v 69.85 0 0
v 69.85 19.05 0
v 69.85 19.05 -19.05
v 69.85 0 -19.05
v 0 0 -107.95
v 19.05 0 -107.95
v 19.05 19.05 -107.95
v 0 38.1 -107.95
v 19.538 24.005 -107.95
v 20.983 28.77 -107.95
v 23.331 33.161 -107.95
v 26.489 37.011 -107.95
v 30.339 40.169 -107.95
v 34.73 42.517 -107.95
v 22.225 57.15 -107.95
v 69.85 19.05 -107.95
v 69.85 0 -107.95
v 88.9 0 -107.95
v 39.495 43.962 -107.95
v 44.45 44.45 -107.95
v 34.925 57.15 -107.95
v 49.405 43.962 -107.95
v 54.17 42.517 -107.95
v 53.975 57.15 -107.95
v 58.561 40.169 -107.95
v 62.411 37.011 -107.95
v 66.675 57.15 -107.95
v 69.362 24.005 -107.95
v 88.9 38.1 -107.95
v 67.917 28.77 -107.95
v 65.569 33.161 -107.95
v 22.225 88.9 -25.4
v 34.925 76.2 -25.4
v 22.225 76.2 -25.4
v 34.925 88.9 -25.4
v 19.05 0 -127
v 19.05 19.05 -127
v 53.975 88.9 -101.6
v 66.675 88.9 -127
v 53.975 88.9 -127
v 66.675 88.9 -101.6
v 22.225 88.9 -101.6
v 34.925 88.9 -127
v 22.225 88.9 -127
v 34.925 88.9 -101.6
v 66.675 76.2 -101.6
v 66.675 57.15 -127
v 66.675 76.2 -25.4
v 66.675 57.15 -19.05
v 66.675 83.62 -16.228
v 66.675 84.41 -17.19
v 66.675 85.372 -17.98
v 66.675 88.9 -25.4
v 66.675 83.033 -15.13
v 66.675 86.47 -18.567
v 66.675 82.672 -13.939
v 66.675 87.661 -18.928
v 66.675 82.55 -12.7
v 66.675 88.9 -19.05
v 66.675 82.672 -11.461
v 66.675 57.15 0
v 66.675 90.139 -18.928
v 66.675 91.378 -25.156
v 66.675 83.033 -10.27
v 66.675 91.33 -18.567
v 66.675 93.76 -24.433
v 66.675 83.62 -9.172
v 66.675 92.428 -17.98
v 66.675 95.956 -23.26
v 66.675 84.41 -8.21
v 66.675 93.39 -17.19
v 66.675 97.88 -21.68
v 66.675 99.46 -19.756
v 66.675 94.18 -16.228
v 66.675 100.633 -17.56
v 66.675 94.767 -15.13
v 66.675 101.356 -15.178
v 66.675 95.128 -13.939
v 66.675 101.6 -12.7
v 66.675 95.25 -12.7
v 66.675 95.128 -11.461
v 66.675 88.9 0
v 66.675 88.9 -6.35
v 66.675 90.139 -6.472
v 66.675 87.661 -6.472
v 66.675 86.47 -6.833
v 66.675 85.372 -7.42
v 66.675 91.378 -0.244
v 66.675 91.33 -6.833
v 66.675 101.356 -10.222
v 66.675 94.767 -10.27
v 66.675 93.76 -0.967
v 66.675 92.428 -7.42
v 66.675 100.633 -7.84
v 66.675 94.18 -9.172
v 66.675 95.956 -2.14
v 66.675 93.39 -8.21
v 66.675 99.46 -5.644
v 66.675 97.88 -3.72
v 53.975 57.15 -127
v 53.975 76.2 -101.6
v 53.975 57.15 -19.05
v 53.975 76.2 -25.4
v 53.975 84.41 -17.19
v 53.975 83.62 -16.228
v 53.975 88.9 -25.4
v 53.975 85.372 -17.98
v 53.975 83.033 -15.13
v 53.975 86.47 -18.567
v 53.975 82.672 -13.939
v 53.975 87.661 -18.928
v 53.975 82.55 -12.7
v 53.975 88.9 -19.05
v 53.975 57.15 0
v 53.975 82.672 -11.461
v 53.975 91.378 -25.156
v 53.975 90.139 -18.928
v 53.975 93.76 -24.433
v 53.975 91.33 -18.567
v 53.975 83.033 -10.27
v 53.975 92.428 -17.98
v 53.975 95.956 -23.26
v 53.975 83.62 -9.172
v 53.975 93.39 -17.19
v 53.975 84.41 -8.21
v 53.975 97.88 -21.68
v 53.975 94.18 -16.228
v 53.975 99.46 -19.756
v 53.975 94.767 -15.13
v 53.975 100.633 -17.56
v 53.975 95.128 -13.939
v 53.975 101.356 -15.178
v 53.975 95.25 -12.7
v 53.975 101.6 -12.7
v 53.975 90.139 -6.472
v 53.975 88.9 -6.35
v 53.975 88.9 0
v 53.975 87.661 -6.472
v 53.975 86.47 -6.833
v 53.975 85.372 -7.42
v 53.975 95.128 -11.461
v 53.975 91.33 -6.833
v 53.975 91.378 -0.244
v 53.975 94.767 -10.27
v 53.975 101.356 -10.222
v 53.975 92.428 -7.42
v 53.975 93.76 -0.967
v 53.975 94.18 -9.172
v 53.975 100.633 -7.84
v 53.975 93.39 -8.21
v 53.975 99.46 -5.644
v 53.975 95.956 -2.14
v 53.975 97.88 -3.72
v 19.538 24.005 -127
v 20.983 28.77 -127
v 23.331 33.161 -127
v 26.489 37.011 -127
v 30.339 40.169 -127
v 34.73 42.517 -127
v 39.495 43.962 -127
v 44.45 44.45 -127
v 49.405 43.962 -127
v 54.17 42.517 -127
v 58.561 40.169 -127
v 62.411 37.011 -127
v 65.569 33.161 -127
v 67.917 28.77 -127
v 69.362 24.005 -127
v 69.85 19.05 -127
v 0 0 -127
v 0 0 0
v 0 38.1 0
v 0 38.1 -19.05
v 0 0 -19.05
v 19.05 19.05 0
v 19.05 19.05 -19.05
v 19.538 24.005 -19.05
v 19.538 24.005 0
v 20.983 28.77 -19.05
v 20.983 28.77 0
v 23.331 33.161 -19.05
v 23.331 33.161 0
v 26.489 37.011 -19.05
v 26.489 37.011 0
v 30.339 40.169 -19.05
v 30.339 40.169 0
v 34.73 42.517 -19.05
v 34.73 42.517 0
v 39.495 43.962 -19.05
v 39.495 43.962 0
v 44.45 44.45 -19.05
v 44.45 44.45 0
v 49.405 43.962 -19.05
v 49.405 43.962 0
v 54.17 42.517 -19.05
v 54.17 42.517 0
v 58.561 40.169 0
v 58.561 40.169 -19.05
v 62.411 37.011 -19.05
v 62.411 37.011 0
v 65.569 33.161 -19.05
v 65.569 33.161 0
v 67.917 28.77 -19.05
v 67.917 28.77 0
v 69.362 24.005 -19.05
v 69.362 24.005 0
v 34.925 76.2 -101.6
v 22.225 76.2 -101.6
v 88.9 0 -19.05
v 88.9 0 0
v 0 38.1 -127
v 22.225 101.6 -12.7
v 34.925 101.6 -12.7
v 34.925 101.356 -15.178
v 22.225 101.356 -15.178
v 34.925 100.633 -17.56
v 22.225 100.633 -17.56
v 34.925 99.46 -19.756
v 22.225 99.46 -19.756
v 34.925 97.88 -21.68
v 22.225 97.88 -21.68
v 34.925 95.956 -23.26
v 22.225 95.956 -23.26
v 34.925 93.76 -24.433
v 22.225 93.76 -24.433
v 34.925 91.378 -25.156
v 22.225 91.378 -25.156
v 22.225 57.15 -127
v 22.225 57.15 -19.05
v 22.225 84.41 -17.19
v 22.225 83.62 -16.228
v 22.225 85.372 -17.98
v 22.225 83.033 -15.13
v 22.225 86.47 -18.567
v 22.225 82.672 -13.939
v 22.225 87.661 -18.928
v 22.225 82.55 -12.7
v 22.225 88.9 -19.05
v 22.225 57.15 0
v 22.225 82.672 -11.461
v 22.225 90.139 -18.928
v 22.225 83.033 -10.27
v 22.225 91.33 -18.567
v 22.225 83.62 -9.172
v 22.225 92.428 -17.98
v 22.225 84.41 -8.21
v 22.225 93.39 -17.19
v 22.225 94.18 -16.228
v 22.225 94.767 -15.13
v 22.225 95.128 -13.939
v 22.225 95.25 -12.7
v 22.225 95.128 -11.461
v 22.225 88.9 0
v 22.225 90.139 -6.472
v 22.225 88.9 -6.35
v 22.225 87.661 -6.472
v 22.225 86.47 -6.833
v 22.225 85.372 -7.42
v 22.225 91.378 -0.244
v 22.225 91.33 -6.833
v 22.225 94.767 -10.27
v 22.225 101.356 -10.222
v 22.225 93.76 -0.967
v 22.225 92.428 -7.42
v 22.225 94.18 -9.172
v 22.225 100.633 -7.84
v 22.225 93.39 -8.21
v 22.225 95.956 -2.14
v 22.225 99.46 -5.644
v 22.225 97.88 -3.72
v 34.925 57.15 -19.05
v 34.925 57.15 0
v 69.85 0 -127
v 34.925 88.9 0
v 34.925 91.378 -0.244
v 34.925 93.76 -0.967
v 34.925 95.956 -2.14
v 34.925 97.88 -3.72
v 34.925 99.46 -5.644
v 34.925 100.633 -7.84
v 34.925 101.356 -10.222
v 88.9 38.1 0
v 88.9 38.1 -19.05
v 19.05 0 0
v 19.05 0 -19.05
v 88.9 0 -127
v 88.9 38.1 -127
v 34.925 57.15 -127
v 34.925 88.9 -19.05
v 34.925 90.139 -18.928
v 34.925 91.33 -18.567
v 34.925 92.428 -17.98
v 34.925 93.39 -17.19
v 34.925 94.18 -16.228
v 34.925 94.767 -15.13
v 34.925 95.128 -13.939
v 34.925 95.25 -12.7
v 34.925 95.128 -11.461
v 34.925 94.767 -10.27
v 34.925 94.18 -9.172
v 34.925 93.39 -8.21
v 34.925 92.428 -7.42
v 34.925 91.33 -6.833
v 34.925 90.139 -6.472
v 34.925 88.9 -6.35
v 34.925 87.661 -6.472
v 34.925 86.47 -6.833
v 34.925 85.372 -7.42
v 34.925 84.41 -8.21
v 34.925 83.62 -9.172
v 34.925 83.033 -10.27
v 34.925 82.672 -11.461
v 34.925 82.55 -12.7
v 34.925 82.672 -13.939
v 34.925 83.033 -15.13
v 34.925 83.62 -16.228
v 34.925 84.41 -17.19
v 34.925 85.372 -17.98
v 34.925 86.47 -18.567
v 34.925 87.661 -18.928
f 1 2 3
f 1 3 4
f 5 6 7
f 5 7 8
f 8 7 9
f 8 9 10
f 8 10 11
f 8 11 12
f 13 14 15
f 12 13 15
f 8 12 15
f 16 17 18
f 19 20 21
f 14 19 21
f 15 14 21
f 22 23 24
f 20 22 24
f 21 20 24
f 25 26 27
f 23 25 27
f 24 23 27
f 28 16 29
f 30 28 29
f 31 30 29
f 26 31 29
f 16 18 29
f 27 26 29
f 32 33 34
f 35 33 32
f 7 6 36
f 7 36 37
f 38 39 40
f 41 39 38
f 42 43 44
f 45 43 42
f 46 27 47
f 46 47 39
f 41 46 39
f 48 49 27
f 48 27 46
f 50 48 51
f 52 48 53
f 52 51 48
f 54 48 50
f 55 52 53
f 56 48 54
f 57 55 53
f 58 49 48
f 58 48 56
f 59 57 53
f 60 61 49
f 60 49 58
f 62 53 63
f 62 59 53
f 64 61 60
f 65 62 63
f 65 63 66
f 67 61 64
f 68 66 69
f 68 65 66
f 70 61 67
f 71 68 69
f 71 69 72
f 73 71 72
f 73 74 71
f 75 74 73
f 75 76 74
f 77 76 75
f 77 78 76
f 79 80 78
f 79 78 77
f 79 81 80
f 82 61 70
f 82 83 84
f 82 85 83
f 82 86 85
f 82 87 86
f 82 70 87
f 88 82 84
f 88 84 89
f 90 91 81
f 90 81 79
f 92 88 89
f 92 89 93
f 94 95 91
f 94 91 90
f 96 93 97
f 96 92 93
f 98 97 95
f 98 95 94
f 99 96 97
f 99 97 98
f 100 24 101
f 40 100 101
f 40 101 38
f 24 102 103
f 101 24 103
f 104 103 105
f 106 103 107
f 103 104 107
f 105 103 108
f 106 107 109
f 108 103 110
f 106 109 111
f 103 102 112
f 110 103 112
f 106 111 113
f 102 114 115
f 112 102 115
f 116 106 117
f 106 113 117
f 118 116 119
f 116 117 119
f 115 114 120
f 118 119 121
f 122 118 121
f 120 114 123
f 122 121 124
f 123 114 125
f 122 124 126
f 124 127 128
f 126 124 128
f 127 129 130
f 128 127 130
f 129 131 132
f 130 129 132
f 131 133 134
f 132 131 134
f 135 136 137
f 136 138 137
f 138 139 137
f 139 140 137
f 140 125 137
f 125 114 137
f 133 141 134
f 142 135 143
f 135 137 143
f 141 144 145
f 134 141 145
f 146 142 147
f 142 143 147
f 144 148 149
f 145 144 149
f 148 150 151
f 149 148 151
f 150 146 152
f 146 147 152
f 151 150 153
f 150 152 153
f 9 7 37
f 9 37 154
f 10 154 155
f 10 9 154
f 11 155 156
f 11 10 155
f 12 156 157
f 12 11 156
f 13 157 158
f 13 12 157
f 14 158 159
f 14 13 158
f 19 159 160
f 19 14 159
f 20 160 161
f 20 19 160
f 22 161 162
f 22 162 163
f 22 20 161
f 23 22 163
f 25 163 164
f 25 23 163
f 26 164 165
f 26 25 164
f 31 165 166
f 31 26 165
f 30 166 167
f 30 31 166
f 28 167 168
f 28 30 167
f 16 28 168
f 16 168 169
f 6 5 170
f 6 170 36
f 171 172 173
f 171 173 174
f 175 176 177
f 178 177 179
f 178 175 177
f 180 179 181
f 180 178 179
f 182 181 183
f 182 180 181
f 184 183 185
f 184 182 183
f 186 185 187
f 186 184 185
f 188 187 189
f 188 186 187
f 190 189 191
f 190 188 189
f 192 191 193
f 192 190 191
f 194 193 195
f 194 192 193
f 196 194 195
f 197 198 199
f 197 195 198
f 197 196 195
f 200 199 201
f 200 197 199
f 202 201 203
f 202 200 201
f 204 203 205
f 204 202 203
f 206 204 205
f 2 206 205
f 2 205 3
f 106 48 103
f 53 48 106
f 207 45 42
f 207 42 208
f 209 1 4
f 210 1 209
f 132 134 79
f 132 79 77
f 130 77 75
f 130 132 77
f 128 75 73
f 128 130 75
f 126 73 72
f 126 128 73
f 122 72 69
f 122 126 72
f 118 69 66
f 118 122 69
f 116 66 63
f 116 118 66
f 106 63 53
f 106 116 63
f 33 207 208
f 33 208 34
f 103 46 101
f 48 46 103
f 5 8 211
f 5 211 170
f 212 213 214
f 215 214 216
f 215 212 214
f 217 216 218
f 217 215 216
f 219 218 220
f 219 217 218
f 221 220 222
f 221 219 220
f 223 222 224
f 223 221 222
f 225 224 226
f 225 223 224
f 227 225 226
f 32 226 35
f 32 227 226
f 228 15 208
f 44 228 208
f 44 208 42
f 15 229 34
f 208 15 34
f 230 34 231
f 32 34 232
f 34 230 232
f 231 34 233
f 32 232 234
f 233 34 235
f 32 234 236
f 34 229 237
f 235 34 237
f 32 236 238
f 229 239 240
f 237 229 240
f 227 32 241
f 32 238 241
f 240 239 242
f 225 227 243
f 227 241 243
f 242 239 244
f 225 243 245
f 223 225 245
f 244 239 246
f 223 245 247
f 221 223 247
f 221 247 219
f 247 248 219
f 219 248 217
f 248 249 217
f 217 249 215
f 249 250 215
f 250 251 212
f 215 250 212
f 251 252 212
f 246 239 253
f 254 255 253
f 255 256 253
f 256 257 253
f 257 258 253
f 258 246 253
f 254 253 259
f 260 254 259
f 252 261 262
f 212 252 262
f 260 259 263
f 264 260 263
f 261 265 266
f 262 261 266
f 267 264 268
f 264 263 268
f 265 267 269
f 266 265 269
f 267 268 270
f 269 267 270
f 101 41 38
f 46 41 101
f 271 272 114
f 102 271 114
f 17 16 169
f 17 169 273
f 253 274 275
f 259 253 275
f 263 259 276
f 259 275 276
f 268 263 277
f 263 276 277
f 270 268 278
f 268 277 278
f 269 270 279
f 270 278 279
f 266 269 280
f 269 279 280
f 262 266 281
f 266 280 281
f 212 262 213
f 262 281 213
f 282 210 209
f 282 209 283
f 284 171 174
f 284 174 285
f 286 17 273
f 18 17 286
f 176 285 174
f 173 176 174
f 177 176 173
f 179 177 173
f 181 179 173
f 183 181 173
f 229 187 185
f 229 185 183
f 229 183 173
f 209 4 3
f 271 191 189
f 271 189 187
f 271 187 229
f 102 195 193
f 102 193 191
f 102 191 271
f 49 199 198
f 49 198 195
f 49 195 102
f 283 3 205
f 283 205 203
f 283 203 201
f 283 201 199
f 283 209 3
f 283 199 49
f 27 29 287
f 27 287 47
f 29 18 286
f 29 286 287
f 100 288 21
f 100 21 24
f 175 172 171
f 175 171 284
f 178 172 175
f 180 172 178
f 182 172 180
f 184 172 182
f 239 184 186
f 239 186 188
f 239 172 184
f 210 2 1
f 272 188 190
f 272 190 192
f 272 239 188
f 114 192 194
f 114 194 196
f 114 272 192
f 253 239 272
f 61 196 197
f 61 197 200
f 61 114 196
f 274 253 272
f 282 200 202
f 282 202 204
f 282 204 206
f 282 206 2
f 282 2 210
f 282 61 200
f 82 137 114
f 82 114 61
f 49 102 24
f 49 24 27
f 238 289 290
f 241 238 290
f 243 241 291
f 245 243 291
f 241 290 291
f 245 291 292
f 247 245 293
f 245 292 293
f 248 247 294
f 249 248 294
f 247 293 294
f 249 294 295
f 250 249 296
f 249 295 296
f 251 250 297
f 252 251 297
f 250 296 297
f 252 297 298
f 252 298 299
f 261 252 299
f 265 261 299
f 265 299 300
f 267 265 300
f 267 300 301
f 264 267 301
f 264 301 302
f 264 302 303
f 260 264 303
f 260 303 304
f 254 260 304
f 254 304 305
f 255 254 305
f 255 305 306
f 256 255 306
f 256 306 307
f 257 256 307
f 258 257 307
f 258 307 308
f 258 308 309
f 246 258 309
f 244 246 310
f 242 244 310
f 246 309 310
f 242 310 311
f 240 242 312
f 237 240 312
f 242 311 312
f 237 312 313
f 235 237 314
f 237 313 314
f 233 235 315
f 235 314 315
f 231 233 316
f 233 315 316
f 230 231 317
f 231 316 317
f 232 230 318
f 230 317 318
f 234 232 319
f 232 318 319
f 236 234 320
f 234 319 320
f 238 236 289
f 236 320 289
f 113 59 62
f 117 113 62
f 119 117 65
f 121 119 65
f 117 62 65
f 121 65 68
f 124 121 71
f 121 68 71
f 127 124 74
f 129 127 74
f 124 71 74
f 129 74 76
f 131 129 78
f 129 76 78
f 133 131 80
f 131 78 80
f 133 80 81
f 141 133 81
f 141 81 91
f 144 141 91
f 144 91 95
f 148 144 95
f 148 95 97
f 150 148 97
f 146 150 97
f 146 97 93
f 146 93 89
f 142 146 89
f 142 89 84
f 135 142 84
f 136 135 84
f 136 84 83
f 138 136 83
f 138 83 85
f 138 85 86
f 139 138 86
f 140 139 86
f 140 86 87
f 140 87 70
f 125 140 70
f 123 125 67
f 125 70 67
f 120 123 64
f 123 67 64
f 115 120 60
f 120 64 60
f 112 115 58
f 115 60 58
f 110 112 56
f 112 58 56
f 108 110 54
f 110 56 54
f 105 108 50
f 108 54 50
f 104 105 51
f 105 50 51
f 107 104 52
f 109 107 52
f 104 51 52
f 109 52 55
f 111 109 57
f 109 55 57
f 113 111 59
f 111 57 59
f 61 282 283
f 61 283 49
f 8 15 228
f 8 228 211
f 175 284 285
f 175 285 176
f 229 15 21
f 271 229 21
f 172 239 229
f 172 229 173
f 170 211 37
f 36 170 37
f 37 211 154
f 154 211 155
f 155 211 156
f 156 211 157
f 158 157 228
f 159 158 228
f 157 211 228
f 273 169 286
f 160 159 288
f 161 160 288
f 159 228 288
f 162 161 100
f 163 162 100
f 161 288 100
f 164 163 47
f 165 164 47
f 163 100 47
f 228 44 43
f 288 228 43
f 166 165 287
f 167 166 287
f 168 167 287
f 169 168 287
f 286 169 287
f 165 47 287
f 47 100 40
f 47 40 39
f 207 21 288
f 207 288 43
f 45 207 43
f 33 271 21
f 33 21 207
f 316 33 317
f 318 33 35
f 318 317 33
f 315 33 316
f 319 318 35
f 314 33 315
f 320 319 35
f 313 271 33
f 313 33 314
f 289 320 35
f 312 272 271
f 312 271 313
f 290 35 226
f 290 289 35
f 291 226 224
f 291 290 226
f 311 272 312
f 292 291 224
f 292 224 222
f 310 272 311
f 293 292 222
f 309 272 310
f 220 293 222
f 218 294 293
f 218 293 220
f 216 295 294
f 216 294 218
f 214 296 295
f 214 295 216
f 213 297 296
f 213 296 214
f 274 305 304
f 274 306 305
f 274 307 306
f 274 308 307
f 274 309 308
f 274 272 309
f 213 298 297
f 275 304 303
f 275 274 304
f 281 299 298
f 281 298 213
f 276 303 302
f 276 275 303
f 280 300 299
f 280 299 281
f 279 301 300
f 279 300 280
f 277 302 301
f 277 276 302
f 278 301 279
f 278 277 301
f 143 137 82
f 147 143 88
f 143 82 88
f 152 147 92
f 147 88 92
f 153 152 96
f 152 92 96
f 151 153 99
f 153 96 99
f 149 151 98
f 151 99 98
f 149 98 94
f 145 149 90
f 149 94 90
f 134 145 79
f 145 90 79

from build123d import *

# Parameters (mm, degrees)
BOSS_EXTRUDE1_DEPTH = 127
SKETCH3_W           = 88.9
SKETCH3_H           = 57.15
CUT_EXTRUDE1_DEPTH  = 166.222070257
SKETCH5_W           = 44.45
SKETCH5_H           = 44.45
BOSS_EXTRUDE2_DEPTH = 127
CUT_EXTRUDE2_DEPTH  = 176.775753803
FILLET1_R           = 12.7
SKETCH8_R           = 6.35
CUT_EXTRUDE3_DEPTH  = 176.775753803
SKETCH9_W           = 19.05
SKETCH9_H           = 44.45
CUT_EXTRUDE4_DEPTH  = 186.350397895


with BuildPart() as part:
    # Sketch2 → Boss-Extrude1 (new body)
    with BuildSketch(Plane.XY):
        with BuildLine():
            Line((0, 0), (19.05, 0))
            Line((19.05, 0), (19.05, 19.05))
            ThreePointArc((19.05, 19.05), (44.45, 44.45), (69.85, 19.05))
            Line((69.85, 19.05), (69.85, 0))
            Line((69.85, 0), (88.9, 0))
            Line((88.9, 0), (88.9, 38.1))
            Line((88.9, 38.1), (66.675, 57.15))
            Line((66.675, 57.15), (22.225, 57.15))
            Line((22.225, 57.15), (0, 38.1))
            Line((0, 38.1), (0, 0))
        make_face()
    extrude(amount=-BOSS_EXTRUDE1_DEPTH)

    # Sketch3 → Cut-Extrude1 (cut, through all)
    with BuildSketch(Plane(origin=(88.9, 0, 0), x_dir=(0, 0, -1), z_dir=(1, 0, 0))):
        with Locations((63.5, 28.575)):
            Rectangle(SKETCH3_W, SKETCH3_H)
    extrude(amount=-CUT_EXTRUDE1_DEPTH, mode=Mode.SUBTRACT)


with BuildPart() as cut_extrude1_piece_1:
    # of the separate pieces the step leaves, piece 1, a body of its own (cut_extrude1_pieces)
    add(part.part.solids().sort_by_distance((0, 0, 0))[0])



with BuildPart() as cut_extrude1_piece_2:
    # of the separate pieces the step leaves, piece 2, a body of its own (cut_extrude1_pieces)
    add(part.part.solids().sort_by_distance((19.05, 0, -107.95))[0])


with BuildPart() as cut_extrude1_piece_1_1:
    add(cut_extrude1_piece_1.part)

    add(cut_extrude1_piece_2.part)  # Boss-Extrude2 merges Cut-Extrude1 piece 2
    # Sketch5 → Boss-Extrude2 (add)
    with BuildSketch(Plane.XY):
        with Locations((44.45, 79.375)):
            Rectangle(SKETCH5_W, SKETCH5_H)
    extrude(amount=-BOSS_EXTRUDE2_DEPTH)

    # Sketch6 → Cut-Extrude2 (cut, through all)
    with BuildSketch(Plane(origin=(66.675, 0, 0), x_dir=(0, 0, -1), z_dir=(1, 0, 0))):
        Polygon((127, 88.9), (101.6, 88.9), (101.6, 76.2), (25.4, 76.2), (25.4, 101.6), (127, 101.6), align=None)
    extrude(amount=-CUT_EXTRUDE2_DEPTH, mode=Mode.SUBTRACT)

    # Fillet1
    fillet1_edges = [cut_extrude1_piece_1_1.edges().sort_by_distance(p)[0] for p in [
        (44.45, 101.6, -25.4),
        (44.45, 101.6, 0),
    ]]
    fillet(fillet1_edges, radius=FILLET1_R - 0.0001)  # a hair under: the kernel refuses the full size

    # Sketch8 → Cut-Extrude3 (cut, through all)
    with BuildSketch(Plane(origin=(66.675, 0, 0), x_dir=(0, 0, -1), z_dir=(1, 0, 0))):
        with Locations((12.7, 88.9)):
            Circle(SKETCH8_R)
    extrude(amount=-CUT_EXTRUDE3_DEPTH, mode=Mode.SUBTRACT)

    # Sketch9 → Cut-Extrude4 (cut, through all)
    with BuildSketch(Plane.XY):
        with Locations((44.45, 79.375)):
            Rectangle(SKETCH9_W, SKETCH9_H)
    extrude(amount=-CUT_EXTRUDE4_DEPTH, mode=Mode.SUBTRACT)


solid = cut_extrude1_piece_1_1.part
